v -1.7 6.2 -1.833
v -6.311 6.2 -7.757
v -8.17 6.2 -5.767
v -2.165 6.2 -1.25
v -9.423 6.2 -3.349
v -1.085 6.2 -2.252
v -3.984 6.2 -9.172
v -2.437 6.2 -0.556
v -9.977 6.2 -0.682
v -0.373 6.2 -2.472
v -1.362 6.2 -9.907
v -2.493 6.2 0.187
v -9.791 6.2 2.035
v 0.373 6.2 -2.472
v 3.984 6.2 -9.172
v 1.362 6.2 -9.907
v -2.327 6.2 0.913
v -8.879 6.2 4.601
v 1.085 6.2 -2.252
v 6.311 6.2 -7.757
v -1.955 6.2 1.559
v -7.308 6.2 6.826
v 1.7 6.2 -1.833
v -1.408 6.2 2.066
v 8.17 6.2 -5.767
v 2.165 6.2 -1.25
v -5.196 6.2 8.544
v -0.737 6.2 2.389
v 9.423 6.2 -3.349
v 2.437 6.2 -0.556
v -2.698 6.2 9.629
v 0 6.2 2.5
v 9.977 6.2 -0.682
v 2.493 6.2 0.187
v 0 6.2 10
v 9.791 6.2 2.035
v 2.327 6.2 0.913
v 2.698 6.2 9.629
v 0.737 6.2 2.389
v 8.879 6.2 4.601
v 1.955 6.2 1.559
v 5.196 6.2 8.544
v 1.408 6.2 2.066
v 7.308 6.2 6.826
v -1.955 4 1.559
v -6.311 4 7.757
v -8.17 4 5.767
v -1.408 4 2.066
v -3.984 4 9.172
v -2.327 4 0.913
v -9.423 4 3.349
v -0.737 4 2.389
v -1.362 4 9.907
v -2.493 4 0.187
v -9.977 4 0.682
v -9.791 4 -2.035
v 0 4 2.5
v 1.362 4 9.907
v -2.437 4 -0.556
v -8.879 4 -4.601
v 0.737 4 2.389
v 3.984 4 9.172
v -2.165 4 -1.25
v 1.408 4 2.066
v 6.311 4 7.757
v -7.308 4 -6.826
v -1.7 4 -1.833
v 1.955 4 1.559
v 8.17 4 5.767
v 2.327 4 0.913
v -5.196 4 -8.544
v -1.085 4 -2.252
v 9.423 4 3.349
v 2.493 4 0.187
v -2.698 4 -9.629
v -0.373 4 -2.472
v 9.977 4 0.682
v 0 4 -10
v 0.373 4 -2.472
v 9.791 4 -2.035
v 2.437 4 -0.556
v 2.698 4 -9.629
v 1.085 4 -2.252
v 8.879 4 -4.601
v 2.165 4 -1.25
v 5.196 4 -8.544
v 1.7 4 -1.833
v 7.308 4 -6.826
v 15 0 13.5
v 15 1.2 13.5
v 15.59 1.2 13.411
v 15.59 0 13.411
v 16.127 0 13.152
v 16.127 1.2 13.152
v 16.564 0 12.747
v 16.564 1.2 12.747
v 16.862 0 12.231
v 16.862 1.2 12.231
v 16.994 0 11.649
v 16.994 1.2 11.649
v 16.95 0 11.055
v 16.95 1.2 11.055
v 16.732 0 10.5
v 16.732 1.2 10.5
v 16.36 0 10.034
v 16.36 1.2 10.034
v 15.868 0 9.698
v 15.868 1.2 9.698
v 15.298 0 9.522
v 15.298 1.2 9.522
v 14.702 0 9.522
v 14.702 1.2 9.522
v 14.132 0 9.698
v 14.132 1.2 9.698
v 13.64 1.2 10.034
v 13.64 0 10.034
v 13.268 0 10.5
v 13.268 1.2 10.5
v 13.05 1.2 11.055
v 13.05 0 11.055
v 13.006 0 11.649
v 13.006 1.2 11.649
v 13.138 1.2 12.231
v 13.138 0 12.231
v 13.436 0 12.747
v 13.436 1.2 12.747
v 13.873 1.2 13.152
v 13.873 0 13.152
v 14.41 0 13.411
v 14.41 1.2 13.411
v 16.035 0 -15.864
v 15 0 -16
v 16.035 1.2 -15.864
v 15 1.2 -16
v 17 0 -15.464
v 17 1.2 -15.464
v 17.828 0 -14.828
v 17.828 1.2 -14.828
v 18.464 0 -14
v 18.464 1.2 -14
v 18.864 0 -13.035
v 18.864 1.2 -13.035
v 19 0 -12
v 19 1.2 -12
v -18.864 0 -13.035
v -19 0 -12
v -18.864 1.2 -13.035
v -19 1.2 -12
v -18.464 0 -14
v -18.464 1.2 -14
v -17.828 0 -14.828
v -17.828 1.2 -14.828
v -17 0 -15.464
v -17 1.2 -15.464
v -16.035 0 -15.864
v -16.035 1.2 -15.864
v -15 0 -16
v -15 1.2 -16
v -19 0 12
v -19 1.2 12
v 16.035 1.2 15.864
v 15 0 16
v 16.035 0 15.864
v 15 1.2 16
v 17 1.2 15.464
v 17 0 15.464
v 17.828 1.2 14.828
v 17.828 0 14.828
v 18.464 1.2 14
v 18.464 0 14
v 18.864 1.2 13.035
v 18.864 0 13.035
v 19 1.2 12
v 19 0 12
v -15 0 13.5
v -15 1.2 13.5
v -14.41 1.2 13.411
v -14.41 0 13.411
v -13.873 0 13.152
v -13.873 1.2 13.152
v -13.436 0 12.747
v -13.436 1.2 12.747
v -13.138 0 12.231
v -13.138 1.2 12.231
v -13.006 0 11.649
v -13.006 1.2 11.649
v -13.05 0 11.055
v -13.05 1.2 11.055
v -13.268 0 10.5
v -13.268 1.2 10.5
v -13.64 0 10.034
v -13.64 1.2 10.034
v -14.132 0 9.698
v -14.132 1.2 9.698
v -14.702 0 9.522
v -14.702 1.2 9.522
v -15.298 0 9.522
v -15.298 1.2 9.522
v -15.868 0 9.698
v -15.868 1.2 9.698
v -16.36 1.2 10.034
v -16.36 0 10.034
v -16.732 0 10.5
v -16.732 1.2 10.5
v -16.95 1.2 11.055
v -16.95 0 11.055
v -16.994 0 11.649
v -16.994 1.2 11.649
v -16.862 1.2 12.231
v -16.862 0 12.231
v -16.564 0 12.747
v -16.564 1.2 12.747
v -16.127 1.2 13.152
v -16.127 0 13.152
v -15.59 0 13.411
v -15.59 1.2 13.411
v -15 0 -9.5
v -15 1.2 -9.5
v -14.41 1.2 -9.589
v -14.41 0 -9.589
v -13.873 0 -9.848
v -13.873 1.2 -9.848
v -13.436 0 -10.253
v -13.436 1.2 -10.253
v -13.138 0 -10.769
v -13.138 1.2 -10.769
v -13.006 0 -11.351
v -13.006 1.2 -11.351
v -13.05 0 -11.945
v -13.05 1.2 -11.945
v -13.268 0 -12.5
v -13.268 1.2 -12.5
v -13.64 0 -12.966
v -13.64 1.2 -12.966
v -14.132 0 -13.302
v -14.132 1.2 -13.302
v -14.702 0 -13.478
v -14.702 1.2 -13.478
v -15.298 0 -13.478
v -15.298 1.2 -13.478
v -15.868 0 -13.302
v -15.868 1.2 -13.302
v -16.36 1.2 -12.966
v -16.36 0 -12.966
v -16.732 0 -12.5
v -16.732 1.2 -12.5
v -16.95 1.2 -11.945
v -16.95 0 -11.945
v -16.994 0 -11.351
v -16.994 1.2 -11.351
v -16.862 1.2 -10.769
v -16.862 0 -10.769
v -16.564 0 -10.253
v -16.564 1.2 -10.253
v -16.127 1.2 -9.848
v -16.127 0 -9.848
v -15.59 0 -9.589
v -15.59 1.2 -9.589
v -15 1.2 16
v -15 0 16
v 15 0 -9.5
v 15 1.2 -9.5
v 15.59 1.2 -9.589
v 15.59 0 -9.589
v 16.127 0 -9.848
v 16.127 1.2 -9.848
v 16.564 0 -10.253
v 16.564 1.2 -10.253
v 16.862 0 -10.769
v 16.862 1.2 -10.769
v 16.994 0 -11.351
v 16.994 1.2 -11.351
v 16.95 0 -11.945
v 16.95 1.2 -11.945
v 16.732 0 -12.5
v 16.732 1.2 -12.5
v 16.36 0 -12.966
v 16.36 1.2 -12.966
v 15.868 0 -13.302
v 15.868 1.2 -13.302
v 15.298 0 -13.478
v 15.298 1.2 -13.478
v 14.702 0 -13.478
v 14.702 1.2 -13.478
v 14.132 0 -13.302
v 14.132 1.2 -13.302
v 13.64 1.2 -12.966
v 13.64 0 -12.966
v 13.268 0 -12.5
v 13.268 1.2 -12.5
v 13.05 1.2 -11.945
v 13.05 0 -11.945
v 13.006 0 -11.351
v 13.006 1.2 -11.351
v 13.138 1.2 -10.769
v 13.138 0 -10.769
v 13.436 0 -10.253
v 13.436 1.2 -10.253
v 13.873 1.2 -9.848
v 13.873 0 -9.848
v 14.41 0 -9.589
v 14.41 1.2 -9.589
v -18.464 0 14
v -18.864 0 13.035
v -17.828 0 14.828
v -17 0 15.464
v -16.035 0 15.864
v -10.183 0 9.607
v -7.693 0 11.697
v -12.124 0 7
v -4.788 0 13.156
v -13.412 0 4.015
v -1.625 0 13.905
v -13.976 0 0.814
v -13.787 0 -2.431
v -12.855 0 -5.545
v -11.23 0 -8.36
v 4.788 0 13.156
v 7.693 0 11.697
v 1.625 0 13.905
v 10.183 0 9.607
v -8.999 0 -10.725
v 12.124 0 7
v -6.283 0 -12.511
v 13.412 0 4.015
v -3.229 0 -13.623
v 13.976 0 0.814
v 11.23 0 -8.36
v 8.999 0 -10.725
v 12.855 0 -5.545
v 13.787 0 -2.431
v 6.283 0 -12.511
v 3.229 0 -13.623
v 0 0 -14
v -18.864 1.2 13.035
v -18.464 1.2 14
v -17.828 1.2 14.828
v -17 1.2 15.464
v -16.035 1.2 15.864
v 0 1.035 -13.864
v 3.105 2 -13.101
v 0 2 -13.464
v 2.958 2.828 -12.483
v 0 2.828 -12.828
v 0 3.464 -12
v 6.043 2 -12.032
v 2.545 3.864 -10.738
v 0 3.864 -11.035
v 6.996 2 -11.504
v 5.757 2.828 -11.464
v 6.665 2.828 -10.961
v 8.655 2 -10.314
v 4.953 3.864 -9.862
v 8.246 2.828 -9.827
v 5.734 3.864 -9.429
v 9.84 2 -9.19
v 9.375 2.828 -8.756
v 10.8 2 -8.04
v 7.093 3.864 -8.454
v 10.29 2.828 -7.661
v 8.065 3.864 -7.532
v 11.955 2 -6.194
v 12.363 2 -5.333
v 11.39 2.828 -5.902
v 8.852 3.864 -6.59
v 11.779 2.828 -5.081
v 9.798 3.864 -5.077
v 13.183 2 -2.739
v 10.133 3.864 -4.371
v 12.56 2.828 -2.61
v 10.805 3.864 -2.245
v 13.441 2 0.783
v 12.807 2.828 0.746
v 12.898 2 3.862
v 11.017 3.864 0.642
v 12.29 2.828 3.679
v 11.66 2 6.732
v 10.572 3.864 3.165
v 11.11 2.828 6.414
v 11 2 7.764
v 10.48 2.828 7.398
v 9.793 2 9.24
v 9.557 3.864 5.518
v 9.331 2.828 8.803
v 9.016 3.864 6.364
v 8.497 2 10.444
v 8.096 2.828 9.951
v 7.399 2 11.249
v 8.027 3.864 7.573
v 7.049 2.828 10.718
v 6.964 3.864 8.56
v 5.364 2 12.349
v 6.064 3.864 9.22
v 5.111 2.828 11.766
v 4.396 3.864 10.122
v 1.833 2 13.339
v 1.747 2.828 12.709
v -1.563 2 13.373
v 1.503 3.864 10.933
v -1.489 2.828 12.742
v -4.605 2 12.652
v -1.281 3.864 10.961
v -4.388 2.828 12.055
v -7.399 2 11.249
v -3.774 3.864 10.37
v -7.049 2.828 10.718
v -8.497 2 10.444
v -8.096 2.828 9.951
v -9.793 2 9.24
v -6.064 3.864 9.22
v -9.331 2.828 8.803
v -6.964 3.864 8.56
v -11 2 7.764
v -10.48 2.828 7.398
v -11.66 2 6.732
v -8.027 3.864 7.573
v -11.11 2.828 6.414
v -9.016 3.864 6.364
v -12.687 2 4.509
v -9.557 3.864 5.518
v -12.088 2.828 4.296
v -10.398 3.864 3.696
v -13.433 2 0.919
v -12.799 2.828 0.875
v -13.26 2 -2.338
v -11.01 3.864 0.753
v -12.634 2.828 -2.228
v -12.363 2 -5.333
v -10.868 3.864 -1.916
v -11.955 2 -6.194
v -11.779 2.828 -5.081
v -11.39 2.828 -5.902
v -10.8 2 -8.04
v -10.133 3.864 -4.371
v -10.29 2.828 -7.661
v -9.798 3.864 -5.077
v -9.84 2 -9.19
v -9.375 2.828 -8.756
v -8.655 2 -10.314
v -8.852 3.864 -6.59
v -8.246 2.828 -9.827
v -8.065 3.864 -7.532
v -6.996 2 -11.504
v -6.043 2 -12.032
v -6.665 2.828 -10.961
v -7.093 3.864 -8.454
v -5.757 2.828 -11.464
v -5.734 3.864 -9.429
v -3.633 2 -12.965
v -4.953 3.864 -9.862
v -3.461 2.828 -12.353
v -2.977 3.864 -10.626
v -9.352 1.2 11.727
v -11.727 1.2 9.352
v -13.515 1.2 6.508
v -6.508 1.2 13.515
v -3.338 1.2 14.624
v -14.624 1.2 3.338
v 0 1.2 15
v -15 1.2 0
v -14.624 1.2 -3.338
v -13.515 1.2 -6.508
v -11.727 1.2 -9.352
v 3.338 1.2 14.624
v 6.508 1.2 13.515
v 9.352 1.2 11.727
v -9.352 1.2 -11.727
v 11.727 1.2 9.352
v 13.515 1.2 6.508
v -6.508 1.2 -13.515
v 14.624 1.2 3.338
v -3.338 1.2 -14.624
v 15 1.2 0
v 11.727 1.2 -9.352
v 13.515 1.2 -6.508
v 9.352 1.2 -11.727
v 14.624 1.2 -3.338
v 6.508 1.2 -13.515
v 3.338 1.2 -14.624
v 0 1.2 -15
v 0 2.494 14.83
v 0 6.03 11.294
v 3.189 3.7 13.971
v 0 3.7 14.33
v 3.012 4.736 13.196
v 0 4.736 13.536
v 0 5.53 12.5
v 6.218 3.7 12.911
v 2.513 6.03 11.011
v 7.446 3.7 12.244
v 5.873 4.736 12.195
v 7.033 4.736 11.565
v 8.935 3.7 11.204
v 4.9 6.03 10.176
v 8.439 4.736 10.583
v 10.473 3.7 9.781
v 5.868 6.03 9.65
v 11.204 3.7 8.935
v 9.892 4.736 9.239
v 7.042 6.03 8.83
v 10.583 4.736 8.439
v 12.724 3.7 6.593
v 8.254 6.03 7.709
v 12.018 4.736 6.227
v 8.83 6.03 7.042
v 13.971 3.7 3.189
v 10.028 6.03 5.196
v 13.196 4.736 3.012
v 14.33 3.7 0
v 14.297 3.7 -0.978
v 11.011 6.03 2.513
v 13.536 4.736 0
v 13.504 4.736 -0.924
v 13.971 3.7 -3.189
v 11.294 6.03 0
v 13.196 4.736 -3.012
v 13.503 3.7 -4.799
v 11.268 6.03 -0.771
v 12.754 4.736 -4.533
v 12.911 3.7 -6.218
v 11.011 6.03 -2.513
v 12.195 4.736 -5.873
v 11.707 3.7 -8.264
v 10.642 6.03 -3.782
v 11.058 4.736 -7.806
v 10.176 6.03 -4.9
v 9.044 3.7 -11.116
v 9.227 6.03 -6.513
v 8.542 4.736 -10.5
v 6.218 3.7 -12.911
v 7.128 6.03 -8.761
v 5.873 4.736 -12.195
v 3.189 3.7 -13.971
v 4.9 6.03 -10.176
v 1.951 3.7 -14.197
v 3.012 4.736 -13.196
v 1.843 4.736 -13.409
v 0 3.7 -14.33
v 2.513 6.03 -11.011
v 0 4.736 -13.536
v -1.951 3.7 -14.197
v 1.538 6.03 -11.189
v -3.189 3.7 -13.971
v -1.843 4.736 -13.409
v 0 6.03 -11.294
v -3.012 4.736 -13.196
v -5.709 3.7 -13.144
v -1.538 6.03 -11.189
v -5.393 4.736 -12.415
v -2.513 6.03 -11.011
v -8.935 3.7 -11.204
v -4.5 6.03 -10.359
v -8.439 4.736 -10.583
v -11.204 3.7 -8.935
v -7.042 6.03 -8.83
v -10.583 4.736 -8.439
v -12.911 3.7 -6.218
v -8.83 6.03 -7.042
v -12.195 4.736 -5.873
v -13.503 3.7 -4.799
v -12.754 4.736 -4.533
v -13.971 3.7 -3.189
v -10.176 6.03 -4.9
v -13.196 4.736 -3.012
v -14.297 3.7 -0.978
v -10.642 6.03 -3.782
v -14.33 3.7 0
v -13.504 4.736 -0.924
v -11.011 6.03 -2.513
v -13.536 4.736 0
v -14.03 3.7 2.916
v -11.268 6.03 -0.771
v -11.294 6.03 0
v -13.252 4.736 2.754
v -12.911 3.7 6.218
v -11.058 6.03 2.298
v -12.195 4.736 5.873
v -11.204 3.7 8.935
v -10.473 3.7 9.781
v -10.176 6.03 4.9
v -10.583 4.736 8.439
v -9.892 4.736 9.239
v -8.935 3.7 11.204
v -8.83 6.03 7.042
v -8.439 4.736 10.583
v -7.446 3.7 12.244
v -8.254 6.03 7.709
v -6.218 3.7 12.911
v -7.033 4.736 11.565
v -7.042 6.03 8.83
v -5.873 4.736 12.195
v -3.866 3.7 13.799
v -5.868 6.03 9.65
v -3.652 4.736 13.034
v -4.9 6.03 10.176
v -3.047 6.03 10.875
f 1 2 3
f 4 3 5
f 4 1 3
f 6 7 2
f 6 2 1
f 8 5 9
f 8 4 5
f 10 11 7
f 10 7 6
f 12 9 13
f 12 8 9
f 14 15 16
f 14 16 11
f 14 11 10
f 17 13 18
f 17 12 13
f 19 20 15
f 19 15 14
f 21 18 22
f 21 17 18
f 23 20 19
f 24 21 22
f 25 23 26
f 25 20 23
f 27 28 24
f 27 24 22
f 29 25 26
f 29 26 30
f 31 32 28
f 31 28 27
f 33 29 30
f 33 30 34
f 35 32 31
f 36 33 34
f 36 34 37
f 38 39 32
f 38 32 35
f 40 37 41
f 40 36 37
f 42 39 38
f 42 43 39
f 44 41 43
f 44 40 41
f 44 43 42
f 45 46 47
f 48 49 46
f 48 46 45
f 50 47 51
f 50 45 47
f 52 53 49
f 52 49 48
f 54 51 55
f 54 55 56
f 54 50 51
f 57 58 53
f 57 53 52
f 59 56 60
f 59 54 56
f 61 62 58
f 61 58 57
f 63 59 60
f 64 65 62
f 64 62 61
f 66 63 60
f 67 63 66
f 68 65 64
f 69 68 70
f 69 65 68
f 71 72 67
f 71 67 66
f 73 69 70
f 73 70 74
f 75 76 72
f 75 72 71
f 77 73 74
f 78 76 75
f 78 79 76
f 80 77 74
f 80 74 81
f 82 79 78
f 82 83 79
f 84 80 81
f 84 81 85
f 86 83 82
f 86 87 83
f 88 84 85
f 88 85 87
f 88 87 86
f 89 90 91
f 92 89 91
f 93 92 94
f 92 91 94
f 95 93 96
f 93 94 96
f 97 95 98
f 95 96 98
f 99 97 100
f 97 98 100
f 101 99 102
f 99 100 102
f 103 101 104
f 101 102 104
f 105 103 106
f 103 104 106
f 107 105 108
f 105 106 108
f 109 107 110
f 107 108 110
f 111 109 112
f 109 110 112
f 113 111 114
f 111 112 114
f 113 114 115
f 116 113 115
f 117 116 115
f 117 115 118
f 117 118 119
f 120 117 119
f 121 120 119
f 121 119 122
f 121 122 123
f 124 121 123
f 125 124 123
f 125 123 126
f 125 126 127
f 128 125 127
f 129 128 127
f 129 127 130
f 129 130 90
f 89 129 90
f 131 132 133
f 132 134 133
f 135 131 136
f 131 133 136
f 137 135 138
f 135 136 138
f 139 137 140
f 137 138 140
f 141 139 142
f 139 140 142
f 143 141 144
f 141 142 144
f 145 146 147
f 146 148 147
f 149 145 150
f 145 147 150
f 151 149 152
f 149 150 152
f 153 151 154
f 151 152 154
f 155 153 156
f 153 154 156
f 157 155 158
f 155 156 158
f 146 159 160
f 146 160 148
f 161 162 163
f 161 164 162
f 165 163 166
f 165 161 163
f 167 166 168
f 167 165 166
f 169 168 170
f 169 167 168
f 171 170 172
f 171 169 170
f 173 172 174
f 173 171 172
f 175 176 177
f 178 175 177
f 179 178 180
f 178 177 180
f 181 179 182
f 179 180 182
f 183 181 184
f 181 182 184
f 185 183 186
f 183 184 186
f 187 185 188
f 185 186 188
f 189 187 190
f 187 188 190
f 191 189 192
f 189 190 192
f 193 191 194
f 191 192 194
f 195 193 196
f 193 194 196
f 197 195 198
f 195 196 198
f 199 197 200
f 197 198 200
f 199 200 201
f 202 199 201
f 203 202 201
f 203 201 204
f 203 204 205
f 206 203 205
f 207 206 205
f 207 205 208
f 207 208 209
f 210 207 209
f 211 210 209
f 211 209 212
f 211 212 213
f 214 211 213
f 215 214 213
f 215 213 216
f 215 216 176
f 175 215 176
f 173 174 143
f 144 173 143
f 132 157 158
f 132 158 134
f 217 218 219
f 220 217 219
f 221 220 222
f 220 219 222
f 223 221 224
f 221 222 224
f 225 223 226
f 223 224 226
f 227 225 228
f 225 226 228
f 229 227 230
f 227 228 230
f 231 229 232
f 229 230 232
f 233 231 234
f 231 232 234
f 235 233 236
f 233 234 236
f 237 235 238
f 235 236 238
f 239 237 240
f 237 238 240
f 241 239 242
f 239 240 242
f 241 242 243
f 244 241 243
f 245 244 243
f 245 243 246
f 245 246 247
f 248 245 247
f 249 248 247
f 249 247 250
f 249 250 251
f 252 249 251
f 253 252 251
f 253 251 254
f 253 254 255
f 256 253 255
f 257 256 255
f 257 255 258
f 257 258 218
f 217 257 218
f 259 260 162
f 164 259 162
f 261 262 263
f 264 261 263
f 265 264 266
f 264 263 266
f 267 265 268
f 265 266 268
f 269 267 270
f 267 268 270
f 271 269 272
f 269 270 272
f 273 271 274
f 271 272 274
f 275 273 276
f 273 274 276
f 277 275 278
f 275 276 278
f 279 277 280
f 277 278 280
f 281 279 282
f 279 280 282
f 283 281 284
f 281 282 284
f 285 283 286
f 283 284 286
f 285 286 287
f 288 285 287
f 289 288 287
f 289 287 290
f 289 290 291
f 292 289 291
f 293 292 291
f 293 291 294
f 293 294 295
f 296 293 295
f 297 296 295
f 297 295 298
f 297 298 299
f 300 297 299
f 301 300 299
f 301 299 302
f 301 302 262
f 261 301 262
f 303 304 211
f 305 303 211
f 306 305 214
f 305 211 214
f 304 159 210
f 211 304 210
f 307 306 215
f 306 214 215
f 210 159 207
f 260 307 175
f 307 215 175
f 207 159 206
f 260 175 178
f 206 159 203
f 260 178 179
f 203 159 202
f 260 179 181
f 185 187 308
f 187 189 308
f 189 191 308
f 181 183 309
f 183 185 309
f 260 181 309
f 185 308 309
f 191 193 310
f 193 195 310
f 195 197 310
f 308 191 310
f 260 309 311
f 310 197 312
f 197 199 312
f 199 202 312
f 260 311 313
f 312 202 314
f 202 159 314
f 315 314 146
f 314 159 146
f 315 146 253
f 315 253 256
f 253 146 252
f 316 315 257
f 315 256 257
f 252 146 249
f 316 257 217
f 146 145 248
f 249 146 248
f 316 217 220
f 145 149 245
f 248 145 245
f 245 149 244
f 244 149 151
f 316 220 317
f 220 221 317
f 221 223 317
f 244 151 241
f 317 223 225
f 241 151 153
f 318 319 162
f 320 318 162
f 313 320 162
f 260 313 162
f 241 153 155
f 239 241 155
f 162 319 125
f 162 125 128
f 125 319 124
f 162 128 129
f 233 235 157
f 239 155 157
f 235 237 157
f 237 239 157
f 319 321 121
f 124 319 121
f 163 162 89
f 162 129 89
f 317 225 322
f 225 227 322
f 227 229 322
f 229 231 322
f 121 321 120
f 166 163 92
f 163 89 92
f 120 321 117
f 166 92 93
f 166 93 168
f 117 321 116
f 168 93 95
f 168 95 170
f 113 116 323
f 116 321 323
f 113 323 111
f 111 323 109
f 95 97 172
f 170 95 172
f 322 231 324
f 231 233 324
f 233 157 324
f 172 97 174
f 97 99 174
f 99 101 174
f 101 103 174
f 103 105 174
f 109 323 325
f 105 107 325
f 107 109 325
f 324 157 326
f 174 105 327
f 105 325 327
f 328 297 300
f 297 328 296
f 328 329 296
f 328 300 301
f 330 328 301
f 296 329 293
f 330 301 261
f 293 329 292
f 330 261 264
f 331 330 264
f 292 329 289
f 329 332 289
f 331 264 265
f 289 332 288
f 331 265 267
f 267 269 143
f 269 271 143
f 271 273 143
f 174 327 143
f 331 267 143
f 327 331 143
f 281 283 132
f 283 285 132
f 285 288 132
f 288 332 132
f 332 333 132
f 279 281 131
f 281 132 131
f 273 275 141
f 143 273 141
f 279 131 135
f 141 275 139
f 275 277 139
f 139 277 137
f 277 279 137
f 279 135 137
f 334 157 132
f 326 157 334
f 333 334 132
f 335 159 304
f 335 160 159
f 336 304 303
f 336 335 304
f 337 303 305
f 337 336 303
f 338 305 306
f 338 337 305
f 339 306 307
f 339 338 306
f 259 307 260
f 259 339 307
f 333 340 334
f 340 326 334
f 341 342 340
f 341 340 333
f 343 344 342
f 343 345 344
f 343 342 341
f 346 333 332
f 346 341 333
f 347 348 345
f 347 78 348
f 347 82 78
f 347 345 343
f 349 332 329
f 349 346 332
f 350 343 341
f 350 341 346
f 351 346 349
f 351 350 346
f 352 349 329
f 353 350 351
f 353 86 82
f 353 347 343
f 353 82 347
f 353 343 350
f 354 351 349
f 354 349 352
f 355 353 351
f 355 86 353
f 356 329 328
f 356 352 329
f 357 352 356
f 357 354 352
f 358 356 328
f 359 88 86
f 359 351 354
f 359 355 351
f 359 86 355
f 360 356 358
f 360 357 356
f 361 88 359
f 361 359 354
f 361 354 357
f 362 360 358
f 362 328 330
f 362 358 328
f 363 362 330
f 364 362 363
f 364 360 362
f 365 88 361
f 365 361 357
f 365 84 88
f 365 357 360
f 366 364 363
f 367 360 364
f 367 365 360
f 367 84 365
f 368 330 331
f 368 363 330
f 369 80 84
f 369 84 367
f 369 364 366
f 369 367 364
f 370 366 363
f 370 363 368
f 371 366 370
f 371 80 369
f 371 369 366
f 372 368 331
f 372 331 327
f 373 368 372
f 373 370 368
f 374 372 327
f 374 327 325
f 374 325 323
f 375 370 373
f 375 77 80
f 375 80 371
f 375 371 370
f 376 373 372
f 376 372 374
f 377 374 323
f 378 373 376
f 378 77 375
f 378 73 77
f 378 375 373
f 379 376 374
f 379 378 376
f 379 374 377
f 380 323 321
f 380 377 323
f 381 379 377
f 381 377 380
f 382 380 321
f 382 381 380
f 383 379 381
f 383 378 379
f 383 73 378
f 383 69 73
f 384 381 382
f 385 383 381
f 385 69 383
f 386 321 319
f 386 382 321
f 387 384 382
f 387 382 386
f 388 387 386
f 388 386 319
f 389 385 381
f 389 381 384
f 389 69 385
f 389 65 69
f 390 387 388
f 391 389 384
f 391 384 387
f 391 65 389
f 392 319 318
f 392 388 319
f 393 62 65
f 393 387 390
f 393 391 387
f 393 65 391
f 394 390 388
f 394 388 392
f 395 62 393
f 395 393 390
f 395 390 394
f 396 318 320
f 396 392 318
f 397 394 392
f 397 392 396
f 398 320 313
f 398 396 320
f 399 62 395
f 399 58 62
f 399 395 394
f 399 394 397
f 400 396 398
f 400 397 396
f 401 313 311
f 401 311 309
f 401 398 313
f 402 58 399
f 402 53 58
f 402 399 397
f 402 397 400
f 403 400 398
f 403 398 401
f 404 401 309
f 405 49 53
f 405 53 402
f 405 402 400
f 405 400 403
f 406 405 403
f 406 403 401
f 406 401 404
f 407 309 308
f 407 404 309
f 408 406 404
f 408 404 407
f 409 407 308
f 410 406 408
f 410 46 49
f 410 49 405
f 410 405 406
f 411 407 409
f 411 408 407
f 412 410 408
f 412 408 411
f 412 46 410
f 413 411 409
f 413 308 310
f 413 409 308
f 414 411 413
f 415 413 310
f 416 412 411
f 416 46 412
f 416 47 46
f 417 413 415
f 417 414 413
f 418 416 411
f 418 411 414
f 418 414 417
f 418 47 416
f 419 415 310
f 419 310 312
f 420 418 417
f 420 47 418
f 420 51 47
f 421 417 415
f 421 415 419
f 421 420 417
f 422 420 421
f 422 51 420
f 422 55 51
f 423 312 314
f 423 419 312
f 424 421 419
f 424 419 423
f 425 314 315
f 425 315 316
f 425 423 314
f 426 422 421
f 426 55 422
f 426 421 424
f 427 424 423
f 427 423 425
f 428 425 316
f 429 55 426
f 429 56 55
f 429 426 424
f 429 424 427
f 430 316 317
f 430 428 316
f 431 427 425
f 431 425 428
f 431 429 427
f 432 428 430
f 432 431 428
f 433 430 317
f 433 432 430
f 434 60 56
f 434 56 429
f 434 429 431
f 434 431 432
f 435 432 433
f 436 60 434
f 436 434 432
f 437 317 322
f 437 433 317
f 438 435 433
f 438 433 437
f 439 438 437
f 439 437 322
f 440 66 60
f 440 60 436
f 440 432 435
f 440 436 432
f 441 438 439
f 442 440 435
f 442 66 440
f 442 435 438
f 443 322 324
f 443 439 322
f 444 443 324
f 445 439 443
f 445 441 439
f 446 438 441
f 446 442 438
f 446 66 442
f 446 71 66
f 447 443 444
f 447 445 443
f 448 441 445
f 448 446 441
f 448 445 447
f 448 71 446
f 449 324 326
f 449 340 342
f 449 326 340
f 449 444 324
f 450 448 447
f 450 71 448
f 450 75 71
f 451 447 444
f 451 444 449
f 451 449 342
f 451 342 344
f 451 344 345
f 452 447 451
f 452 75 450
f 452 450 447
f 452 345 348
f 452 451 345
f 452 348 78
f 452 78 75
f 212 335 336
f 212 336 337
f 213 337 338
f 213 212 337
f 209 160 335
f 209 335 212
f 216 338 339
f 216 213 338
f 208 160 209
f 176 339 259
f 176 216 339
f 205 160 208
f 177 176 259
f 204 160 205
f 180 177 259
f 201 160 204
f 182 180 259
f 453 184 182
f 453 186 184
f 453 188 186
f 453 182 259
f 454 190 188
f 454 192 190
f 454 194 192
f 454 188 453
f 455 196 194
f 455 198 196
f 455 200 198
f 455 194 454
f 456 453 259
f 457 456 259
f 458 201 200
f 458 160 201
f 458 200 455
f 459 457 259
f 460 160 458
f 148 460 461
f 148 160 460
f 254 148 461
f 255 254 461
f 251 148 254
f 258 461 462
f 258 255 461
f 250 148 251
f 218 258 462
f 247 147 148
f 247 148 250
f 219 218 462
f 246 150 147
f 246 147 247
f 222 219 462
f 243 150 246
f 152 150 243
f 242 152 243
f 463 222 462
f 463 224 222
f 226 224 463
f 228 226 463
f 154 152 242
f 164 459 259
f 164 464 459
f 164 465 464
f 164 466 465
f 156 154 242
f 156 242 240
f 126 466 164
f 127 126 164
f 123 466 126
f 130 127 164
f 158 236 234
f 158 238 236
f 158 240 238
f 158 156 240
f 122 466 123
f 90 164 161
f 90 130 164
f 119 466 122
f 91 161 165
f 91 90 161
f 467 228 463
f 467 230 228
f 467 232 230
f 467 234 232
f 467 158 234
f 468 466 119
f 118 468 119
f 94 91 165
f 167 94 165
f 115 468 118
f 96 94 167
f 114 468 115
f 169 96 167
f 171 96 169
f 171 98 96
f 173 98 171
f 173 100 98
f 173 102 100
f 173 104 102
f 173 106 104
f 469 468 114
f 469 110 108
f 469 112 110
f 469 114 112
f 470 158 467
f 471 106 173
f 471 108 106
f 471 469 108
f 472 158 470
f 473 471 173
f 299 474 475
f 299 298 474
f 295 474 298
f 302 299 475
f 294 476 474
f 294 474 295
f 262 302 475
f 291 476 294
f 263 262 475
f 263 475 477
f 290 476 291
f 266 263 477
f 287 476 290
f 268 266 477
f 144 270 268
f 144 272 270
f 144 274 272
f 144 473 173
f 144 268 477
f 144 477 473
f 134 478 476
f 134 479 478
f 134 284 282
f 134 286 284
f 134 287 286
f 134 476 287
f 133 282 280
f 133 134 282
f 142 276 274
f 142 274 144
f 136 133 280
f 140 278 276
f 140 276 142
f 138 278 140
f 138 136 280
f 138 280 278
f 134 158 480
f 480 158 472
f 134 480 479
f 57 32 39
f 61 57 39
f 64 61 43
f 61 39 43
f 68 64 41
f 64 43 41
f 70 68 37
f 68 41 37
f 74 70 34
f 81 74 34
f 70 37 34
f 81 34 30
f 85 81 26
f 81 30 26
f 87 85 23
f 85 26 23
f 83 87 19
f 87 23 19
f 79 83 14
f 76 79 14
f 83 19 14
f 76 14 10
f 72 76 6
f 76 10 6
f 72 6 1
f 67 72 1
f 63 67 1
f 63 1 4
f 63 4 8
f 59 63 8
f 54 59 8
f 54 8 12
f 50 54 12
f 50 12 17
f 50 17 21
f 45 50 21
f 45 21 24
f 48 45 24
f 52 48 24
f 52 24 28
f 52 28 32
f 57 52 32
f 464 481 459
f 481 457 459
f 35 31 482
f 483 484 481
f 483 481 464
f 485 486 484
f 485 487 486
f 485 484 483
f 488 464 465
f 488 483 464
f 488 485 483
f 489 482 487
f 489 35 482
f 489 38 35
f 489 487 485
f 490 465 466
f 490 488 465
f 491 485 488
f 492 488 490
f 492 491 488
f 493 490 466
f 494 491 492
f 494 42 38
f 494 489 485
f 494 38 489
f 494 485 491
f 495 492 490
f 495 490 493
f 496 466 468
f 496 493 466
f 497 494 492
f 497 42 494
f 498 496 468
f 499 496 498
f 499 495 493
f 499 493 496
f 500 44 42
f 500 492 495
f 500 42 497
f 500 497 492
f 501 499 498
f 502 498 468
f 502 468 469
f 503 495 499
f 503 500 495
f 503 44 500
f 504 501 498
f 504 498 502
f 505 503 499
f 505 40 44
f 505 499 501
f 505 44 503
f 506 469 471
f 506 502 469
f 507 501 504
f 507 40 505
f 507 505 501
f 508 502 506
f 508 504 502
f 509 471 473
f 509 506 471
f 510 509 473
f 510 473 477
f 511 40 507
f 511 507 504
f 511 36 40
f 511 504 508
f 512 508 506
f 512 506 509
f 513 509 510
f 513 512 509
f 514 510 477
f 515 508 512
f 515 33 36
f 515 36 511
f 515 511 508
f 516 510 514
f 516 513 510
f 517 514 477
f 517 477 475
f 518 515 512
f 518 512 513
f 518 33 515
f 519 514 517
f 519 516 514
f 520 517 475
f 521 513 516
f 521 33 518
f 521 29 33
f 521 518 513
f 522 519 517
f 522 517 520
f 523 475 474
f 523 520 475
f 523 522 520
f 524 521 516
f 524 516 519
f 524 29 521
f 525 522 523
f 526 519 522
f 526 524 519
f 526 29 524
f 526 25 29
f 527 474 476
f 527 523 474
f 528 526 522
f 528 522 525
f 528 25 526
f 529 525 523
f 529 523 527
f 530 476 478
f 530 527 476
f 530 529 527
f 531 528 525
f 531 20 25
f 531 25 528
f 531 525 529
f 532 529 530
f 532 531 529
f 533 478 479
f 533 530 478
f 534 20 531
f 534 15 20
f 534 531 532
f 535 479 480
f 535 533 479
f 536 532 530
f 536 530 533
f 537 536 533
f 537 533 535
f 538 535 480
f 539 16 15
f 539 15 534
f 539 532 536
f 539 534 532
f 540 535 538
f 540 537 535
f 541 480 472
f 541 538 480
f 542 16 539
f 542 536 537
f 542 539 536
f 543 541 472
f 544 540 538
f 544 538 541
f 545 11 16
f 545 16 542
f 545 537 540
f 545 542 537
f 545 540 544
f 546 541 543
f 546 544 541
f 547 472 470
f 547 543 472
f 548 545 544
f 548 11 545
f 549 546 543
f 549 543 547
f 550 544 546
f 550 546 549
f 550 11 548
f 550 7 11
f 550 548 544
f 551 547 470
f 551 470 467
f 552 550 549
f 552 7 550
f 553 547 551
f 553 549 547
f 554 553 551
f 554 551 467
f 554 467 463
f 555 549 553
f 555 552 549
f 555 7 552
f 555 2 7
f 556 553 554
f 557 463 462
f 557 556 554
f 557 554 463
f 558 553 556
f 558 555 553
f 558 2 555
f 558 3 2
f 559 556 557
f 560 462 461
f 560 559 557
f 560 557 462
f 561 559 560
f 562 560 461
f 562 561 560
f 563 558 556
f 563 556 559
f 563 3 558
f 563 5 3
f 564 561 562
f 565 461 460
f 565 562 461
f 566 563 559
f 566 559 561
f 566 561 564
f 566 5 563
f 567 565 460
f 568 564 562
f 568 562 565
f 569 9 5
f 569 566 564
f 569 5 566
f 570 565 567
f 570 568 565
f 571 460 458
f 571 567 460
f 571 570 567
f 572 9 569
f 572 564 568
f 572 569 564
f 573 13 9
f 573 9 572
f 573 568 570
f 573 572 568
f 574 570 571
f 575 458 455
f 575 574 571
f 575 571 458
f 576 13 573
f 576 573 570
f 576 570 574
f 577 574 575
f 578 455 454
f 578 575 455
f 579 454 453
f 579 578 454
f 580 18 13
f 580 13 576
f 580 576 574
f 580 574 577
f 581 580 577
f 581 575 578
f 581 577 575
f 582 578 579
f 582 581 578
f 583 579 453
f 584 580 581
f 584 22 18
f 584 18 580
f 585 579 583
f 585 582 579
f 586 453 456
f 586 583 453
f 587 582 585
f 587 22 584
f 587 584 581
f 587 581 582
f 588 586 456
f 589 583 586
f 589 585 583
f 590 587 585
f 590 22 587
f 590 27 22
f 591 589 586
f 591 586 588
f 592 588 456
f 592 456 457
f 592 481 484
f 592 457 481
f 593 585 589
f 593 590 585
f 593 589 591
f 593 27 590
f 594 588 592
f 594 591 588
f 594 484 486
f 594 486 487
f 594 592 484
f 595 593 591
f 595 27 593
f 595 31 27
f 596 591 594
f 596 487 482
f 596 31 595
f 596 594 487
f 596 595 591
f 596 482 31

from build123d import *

# Parameters (mm, degrees)
SKIZZE1_W                       = 38
SKIZZE1_H                       = 32
AUFSATZ_LINEAR_AUSTRAGEN1_DEPTH = 1.2
SKIZZE2_R                       = 15
AUFSATZ_LINEAR_AUSTRAGEN2_DEPTH = 5
VERRUNDUNG1_R                   = 5
SCHNITT_LINEAR_AUSTRAGEN1_REACH = 27.338
SKIZZE3_R                       = 2
SKIZZE4_R                       = 14
SCHNITT_LINEAR_AUSTRAGEN2_DEPTH = 4
VERRUNDUNG2_R                   = 4
SKIZZE5_R                       = 2.5
SCHNITT_LINEAR_AUSTRAGEN3_DEPTH = 26.601562452
VERRUNDUNG3_R                   = 4


with BuildPart() as part:
    # Skizze1 → Aufsatz-Linear austragen1 (new body)
    with BuildSketch(Plane(origin=(0, 0, 0), x_dir=(1, 0, 0), z_dir=(0, 1, 0))):
        Rectangle(SKIZZE1_W, SKIZZE1_H)
    extrude(amount=AUFSATZ_LINEAR_AUSTRAGEN1_DEPTH)

    # Skizze2 → Aufsatz-Linear austragen2 (add)
    with BuildSketch(Plane(origin=(0, 1.2, 0), x_dir=(1, 0, 0), z_dir=(0, 1, 0))):
        with Locations(Location((0, 0, 0), (0, 0, 270))):
            Circle(SKIZZE2_R)
    extrude(amount=AUFSATZ_LINEAR_AUSTRAGEN2_DEPTH)

    # Verrundung1
    verrundung1_edges = [part.edges().sort_by_distance(p)[0] for p in [
        (0, 6.2, -15),
    ]]
    fillet(verrundung1_edges, radius=VERRUNDUNG1_R - 0.0001)  # a hair under: the kernel refuses the full size

    # Skizze3 → Schnitt-Linear austragen1 (cut, up to next)
    with BuildSketch(Plane(origin=(0, 1.2, 0), x_dir=(1, 0, 0), z_dir=(0, 1, 0)), mode=Mode.PRIVATE) as schnitt_linear_austragen1_sk1:
        with Locations(Location((-15, 11.5, 0), (0, 0, 270))):
            Circle(SKIZZE3_R)
    schnitt_linear_austragen1_tool1 = extrude(schnitt_linear_austragen1_sk1.sketch, amount=-SCHNITT_LINEAR_AUSTRAGEN1_REACH, mode=Mode.PRIVATE) & part.part
    # Skizze3 → Schnitt-Linear austragen1 (cut, up to next)
    with BuildSketch(Plane(origin=(0, 1.2, 0), x_dir=(1, 0, 0), z_dir=(0, 1, 0)), mode=Mode.PRIVATE) as schnitt_linear_austragen1_sk2:
        with Locations(Location((15, 11.5, 0), (0, 0, 270))):
            Circle(SKIZZE3_R)
    schnitt_linear_austragen1_tool2 = extrude(schnitt_linear_austragen1_sk2.sketch, amount=-SCHNITT_LINEAR_AUSTRAGEN1_REACH, mode=Mode.PRIVATE) & part.part
    # Skizze3 → Schnitt-Linear austragen1 (cut, up to next)
    with BuildSketch(Plane(origin=(0, 1.2, 0), x_dir=(1, 0, 0), z_dir=(0, 1, 0)), mode=Mode.PRIVATE) as schnitt_linear_austragen1_sk3:
        with Locations(Location((15, -11.5, 0), (0, 0, 270))):
            Circle(SKIZZE3_R)
    schnitt_linear_austragen1_tool3 = extrude(schnitt_linear_austragen1_sk3.sketch, amount=-SCHNITT_LINEAR_AUSTRAGEN1_REACH, mode=Mode.PRIVATE) & part.part
    # Skizze3 → Schnitt-Linear austragen1 (cut, up to next)
    with BuildSketch(Plane(origin=(0, 1.2, 0), x_dir=(1, 0, 0), z_dir=(0, 1, 0)), mode=Mode.PRIVATE) as schnitt_linear_austragen1_sk4:
        with Locations(Location((-15, -11.5, 0), (0, 0, 270))):
            Circle(SKIZZE3_R)
    schnitt_linear_austragen1_tool4 = extrude(schnitt_linear_austragen1_sk4.sketch, amount=-SCHNITT_LINEAR_AUSTRAGEN1_REACH, mode=Mode.PRIVATE) & part.part
    add(schnitt_linear_austragen1_tool1.solids().sort_by_distance((-15, 1.2, -11.5))[0], mode=Mode.SUBTRACT)
    add(schnitt_linear_austragen1_tool2.solids().sort_by_distance((15, 1.2, -11.5))[0], mode=Mode.SUBTRACT)
    add(schnitt_linear_austragen1_tool3.solids().sort_by_distance((15, 1.2, 11.5))[0], mode=Mode.SUBTRACT)
    add(schnitt_linear_austragen1_tool4.solids().sort_by_distance((-15, 1.2, 11.5))[0], mode=Mode.SUBTRACT)

    # Skizze4 → Schnitt-Linear austragen2 (cut)
    with BuildSketch(Plane.XZ):
        with Locations(Location((0, 0, 0), (0, 0, 270))):
            Circle(SKIZZE4_R)
    extrude(amount=-SCHNITT_LINEAR_AUSTRAGEN2_DEPTH, mode=Mode.SUBTRACT)

    # Verrundung2
    verrundung2_edges = [part.edges().sort_by_distance(p)[0] for p in [
        (0, 4, 14),
    ]]
    fillet(verrundung2_edges, radius=VERRUNDUNG2_R - 0.0001)  # a hair under: the kernel refuses the full size

    # Skizze5 → Schnitt-Linear austragen3 (cut, through all)
    with BuildSketch(Plane(origin=(0, 6.2, 0), x_dir=(1, 0, 0), z_dir=(0, 1, 0))):
        with Locations(Location((0, 0, 0), (0, 0, 270))):
            Circle(SKIZZE5_R)
    extrude(amount=-SCHNITT_LINEAR_AUSTRAGEN3_DEPTH, mode=Mode.SUBTRACT)

    # Verrundung3
    verrundung3_edges = [part.edges().sort_by_distance(p)[0] for p in [
        (19, 0.6, 16),
        (-19, 0.6, 16),
        (-19, 0.6, -16),
        (19, 0.6, -16),
    ]]
    fillet(verrundung3_edges, radius=VERRUNDUNG3_R)


solid = part.part
